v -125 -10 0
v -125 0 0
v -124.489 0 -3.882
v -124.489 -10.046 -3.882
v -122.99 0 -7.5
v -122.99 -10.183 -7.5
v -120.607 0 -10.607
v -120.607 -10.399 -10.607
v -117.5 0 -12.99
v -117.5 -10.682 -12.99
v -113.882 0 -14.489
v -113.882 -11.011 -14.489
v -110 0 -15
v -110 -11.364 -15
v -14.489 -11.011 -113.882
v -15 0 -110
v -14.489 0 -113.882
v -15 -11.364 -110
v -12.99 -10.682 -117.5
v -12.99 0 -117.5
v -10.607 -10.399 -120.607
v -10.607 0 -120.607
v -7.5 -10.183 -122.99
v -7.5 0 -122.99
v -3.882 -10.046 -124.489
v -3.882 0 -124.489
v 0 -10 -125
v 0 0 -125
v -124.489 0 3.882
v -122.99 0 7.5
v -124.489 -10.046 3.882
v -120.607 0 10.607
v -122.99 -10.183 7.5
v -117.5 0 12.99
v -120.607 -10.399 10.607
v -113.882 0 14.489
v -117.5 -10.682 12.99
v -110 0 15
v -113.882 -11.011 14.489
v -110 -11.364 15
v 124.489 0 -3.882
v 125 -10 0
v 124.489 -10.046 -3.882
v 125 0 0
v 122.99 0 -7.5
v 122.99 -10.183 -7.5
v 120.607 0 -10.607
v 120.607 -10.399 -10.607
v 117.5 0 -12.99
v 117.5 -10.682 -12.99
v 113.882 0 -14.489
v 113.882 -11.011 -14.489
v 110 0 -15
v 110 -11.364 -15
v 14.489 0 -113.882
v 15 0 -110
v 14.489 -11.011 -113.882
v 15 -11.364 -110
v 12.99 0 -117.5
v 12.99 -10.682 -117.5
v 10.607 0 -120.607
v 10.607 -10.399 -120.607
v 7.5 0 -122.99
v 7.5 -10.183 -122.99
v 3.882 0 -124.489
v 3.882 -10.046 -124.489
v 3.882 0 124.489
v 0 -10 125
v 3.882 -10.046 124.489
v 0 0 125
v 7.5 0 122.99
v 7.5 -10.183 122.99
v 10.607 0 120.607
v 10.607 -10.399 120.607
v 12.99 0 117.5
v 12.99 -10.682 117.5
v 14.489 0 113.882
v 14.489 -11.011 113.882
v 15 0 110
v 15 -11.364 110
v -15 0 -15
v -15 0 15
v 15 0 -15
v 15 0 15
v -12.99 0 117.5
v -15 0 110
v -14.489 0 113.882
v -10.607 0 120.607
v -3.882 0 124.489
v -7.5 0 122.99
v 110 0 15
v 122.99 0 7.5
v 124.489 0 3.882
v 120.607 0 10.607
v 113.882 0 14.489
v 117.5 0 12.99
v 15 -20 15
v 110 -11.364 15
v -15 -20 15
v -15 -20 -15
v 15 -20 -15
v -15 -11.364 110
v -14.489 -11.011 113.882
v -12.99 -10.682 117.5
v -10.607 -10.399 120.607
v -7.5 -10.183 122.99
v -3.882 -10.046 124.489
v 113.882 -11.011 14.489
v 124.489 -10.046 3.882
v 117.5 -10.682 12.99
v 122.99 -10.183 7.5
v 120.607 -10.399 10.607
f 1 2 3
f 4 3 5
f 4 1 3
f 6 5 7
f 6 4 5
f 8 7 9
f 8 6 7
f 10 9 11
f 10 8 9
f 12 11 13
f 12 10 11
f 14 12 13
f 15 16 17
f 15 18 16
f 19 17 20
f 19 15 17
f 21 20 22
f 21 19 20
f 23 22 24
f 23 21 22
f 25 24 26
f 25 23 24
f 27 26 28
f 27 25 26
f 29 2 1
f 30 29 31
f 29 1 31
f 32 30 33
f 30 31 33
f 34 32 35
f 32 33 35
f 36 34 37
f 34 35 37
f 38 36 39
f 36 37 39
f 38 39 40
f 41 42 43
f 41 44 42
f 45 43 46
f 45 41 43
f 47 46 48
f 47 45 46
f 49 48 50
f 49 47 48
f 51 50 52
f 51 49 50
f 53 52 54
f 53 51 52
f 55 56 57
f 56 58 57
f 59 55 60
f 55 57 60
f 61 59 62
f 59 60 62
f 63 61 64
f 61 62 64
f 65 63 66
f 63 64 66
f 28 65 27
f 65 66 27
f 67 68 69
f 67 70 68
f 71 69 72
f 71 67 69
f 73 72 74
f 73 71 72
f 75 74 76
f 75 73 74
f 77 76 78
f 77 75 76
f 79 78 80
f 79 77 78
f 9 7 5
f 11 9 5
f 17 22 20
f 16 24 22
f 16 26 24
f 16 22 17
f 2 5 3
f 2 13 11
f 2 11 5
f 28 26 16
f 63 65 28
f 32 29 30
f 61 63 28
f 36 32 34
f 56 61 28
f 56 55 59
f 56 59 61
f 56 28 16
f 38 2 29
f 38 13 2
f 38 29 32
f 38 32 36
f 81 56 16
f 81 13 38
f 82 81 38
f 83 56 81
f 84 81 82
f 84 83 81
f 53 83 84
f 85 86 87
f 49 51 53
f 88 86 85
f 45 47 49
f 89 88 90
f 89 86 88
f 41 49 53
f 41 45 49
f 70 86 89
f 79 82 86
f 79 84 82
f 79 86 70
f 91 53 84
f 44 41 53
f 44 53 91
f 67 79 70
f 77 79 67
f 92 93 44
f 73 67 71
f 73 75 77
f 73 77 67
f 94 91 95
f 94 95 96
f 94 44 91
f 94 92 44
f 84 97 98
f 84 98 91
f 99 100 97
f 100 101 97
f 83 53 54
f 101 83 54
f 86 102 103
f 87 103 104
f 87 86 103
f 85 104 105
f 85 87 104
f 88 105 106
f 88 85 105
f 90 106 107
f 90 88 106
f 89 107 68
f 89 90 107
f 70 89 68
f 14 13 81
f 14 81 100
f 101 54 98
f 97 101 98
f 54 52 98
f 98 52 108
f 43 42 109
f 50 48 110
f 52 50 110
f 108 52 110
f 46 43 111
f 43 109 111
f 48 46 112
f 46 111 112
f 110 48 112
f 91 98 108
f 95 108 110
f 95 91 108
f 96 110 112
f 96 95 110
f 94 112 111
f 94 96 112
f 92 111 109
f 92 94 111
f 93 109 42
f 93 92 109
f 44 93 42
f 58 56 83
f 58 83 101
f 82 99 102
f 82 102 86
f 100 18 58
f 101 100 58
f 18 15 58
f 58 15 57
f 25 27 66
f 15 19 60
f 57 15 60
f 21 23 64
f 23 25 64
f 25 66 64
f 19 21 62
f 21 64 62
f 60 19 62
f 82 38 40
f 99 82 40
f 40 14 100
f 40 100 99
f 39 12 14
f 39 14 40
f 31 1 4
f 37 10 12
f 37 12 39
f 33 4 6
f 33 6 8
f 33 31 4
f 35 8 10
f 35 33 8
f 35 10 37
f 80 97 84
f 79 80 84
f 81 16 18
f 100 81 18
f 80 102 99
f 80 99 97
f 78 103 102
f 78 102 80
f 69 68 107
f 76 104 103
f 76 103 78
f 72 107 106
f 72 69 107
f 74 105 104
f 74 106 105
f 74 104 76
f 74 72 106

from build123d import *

# Parameters (mm, degrees)
F0_W      = 30
F0_H      = 30
F1_DEPTH  = 20
F5_W      = 20
F5_H      = 30
F6_DEPTH  = 110
F4_W      = 30
F4_H      = 20
F7_DEPTH  = 110
F3_W      = 20
F3_H      = 30
F8_DEPTH  = 110
F2_W      = 30
F2_H      = 20
F9_DEPTH  = 110
F10_SIZE2 = 10
F10_SIZE  = 110
F11_R     = 14.99999


# Not quite as in the source:
# - a fillet or chamfer is up to 0.001 mm smaller than in the source, because OpenCascade refuses the exact size


with BuildPart() as f1:
    # F0 (on Front) → F1 (new body)
    with BuildSketch(Plane.XZ):
        Rectangle(F0_W, F0_H)
    extrude(amount=F1_DEPTH)

    # F5 (on face) → F6 (join)
    with BuildSketch(Plane.YZ.offset(15)):
        with Locations((-10, 0)):
            Rectangle(F5_W, F5_H)
    extrude(amount=F6_DEPTH)

    # F4 (on face) → F7 (join)
    with BuildSketch(Plane.XY.offset(15)):
        with Locations((0, -10)):
            Rectangle(F4_W, F4_H)
    extrude(amount=F7_DEPTH)

    # F3 (on face) → F8 (join)
    with BuildSketch(Plane(origin=(-15, 0, 0), x_dir=(0, -1, 0), z_dir=(-1, 0, 0))):
        with Locations((10, 0)):
            Rectangle(F3_W, F3_H)
    extrude(amount=F8_DEPTH)

    # F2 (on face) → F9 (join)
    with BuildSketch(Plane(origin=(0, 0, -15), x_dir=(1, 0, 0), z_dir=(0, 0, -1))):
        with Locations((0, 10)):
            Rectangle(F2_W, F2_H)
    extrude(amount=F9_DEPTH)

    # F10
    f10_edges = [f1.edges().sort_by_distance(p)[0] for p in [
        (-125, -20, 0),
        (0, -20, -125),
        (125, -20, 0),
        (0, -20, 125),
    ]]
    f10_side = f1.faces().sort_by_distance((0, -20, 0))[0]
    chamfer(f10_edges, length=F10_SIZE, length2=F10_SIZE2, reference=f10_side)

    # F11 (radius 15 in the source; OpenCascade refuses exactly that, so slightly less here)
    f11_edges = [f1.edges().sort_by_distance(p)[0] for p in [
        (15, -5, 125),
        (-15, -5, 125),
        (-125, -5, 15),
        (-125, -5, -15),
        (-15, -5, -125),
        (15, -5, -125),
        (125, -5, -15),
        (125, -5, 15),
    ]]
    fillet(f11_edges, radius=F11_R)


solid = f1.part
